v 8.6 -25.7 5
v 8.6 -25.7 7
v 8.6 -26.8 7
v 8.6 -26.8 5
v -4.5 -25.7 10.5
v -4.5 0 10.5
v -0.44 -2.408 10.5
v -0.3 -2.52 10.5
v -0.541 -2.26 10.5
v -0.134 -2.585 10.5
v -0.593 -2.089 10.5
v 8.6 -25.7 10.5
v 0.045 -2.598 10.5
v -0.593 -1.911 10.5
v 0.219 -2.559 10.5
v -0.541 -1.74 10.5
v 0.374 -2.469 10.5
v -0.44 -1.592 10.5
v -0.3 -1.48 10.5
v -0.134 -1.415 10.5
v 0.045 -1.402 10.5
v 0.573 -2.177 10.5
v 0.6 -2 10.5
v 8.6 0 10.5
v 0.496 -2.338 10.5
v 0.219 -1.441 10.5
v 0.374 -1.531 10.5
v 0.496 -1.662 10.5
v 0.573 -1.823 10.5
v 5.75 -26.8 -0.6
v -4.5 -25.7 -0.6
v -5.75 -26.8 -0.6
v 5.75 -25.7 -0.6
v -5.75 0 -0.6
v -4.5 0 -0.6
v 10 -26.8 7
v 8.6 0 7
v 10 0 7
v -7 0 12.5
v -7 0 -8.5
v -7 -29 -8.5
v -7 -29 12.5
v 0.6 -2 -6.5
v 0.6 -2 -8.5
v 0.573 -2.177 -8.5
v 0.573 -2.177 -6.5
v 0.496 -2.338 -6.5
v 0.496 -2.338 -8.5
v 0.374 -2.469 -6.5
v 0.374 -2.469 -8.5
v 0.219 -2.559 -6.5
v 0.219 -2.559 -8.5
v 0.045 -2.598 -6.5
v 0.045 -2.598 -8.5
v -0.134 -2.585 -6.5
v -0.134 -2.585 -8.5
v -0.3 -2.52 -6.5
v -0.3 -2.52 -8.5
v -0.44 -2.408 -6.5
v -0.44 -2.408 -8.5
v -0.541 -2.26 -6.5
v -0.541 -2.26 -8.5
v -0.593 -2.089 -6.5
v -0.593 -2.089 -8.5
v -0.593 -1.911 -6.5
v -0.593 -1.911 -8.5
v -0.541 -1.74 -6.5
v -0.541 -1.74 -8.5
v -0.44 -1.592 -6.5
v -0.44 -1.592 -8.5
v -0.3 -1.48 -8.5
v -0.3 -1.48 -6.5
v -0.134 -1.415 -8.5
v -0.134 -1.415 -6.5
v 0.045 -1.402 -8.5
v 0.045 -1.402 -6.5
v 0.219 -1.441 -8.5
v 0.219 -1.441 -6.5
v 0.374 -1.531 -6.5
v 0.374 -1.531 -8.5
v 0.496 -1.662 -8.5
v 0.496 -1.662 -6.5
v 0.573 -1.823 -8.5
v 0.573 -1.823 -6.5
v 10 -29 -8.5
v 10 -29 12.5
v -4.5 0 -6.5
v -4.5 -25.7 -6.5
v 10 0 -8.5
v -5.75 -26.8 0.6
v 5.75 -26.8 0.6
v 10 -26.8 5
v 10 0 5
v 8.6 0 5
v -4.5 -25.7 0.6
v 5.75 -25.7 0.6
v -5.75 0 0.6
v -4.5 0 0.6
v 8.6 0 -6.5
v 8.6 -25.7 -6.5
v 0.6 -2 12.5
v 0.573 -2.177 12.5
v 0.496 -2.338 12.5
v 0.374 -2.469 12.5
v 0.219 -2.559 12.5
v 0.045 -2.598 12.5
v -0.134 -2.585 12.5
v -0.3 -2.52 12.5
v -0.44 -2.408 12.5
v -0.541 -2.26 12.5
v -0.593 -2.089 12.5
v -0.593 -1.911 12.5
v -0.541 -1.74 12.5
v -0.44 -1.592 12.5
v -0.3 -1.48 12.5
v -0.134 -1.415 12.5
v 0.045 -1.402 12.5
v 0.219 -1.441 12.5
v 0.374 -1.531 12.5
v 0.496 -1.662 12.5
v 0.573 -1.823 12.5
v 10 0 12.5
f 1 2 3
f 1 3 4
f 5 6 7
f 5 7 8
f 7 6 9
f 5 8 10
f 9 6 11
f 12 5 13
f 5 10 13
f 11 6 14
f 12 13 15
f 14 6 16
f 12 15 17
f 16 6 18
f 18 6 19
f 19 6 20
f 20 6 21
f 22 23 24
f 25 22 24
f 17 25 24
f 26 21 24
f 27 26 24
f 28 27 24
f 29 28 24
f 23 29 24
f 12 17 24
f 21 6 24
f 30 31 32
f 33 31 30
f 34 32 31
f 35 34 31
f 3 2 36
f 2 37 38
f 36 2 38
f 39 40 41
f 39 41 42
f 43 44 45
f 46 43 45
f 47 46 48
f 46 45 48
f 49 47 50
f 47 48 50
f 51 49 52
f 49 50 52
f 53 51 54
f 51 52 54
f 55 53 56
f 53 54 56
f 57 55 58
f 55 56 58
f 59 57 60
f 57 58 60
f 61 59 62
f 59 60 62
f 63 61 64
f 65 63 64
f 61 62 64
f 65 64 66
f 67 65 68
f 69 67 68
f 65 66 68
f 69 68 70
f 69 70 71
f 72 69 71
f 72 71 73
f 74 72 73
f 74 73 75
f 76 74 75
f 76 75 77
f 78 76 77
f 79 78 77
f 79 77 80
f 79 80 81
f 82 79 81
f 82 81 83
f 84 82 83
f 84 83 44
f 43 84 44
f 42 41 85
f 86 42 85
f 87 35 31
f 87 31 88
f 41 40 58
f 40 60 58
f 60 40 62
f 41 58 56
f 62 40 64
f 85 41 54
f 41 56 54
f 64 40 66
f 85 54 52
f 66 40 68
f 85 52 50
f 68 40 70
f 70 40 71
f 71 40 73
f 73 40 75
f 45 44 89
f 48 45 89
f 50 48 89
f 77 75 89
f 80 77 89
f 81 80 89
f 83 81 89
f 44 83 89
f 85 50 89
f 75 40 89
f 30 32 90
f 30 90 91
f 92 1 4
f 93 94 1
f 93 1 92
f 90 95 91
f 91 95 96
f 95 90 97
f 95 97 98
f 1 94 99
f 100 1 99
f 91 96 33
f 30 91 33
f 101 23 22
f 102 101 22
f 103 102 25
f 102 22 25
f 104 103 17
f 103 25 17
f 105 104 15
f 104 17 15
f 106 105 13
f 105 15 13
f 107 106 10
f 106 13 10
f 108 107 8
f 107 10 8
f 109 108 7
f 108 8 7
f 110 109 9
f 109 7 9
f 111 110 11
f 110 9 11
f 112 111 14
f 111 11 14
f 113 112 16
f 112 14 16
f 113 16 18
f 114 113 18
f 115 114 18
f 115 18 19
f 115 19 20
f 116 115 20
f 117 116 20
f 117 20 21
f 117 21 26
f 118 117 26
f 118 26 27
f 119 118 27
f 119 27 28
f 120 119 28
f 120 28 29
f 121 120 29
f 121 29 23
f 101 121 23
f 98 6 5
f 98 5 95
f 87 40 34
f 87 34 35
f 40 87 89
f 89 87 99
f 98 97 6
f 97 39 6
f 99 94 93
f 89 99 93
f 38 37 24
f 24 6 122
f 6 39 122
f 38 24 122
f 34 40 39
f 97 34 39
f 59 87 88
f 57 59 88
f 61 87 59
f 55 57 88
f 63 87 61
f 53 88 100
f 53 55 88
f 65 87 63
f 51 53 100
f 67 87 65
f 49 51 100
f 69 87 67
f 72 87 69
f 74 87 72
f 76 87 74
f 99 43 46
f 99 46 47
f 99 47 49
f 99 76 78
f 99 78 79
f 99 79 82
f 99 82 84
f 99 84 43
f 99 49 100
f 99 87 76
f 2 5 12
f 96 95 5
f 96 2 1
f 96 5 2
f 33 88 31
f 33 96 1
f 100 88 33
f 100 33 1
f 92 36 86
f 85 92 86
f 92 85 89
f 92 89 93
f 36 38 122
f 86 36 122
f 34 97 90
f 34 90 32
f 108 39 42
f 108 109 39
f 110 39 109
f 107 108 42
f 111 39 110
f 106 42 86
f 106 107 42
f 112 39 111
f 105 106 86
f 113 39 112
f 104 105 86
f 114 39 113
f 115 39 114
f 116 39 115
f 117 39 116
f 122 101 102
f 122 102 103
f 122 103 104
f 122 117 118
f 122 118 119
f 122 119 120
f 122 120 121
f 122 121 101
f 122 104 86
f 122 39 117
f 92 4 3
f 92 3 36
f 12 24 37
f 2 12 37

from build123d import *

# Parameters (mm, degrees)
SKETCH285_W     = 17
SKETCH285_H     = 21
PAD190_DEPTH    = 29
SKETCH281_W     = 13.1
SKETCH281_H     = 17
POCKET037_DEPTH = 25.7
SKETCH268_W     = 11.5
SKETCH268_H     = 1.2
SKETCH268_W_2   = 1.4
SKETCH268_H_2   = 2
POCKET039_DEPTH = 26.8
SKETCH271_R     = 0.6
POCKET041_DEPTH = 50
SKETCH278_W     = 0.6
SKETCH278_H     = 3
POCKET038_DEPTH = 2.5


with BuildPart() as part:
    # Sketch285 → Pad190 (new body)
    with BuildSketch(Plane.XZ):
        with Locations((1.5, 2)):
            Rectangle(SKETCH285_W, SKETCH285_H)
    extrude(amount=PAD190_DEPTH)

    # Sketch281 (on Face5 of Pad190) → Pocket037 (cut)
    with BuildSketch(Plane(origin=(0, 0, 0), x_dir=(1, 0, 0), z_dir=(0, 1, 0))):
        with Locations((2.05, -2)):
            Rectangle(SKETCH281_W, SKETCH281_H)
    extrude(amount=-POCKET037_DEPTH, mode=Mode.SUBTRACT)

    # Sketch268 (on Face4 of Pocket037) → Pocket039 (cut)
    with BuildSketch(Plane(origin=(0, 0, 0), x_dir=(1, 0, 0), z_dir=(0, 1, 0))):
        Rectangle(SKETCH268_W, SKETCH268_H)
        with Locations((9.3, -6)):
            Rectangle(SKETCH268_W_2, SKETCH268_H_2)
    extrude(amount=-POCKET039_DEPTH, mode=Mode.SUBTRACT)

    # Sketch271 (on Face6 of Pocket039) → Pocket041 (cut)
    with BuildSketch(Plane(origin=(0, 0, -8.5), x_dir=(1, 0, 0), z_dir=(0, 0, -1))):
        with Locations((0, 2)):
            Circle(SKETCH271_R)
    extrude(amount=-POCKET041_DEPTH, mode=Mode.SUBTRACT)

    # Sketch278 (on Face21 of Pocket041) → Pocket038 (cut)
    with BuildSketch(Plane(origin=(8.6, 0, 0), x_dir=(0, 0, 1), z_dir=(1, 0, 0))):
        with Locations((0, -9)):
            Rectangle(SKETCH278_W, SKETCH278_H)
    extrude(amount=-POCKET038_DEPTH, mode=Mode.SUBTRACT)


solid = part.part
